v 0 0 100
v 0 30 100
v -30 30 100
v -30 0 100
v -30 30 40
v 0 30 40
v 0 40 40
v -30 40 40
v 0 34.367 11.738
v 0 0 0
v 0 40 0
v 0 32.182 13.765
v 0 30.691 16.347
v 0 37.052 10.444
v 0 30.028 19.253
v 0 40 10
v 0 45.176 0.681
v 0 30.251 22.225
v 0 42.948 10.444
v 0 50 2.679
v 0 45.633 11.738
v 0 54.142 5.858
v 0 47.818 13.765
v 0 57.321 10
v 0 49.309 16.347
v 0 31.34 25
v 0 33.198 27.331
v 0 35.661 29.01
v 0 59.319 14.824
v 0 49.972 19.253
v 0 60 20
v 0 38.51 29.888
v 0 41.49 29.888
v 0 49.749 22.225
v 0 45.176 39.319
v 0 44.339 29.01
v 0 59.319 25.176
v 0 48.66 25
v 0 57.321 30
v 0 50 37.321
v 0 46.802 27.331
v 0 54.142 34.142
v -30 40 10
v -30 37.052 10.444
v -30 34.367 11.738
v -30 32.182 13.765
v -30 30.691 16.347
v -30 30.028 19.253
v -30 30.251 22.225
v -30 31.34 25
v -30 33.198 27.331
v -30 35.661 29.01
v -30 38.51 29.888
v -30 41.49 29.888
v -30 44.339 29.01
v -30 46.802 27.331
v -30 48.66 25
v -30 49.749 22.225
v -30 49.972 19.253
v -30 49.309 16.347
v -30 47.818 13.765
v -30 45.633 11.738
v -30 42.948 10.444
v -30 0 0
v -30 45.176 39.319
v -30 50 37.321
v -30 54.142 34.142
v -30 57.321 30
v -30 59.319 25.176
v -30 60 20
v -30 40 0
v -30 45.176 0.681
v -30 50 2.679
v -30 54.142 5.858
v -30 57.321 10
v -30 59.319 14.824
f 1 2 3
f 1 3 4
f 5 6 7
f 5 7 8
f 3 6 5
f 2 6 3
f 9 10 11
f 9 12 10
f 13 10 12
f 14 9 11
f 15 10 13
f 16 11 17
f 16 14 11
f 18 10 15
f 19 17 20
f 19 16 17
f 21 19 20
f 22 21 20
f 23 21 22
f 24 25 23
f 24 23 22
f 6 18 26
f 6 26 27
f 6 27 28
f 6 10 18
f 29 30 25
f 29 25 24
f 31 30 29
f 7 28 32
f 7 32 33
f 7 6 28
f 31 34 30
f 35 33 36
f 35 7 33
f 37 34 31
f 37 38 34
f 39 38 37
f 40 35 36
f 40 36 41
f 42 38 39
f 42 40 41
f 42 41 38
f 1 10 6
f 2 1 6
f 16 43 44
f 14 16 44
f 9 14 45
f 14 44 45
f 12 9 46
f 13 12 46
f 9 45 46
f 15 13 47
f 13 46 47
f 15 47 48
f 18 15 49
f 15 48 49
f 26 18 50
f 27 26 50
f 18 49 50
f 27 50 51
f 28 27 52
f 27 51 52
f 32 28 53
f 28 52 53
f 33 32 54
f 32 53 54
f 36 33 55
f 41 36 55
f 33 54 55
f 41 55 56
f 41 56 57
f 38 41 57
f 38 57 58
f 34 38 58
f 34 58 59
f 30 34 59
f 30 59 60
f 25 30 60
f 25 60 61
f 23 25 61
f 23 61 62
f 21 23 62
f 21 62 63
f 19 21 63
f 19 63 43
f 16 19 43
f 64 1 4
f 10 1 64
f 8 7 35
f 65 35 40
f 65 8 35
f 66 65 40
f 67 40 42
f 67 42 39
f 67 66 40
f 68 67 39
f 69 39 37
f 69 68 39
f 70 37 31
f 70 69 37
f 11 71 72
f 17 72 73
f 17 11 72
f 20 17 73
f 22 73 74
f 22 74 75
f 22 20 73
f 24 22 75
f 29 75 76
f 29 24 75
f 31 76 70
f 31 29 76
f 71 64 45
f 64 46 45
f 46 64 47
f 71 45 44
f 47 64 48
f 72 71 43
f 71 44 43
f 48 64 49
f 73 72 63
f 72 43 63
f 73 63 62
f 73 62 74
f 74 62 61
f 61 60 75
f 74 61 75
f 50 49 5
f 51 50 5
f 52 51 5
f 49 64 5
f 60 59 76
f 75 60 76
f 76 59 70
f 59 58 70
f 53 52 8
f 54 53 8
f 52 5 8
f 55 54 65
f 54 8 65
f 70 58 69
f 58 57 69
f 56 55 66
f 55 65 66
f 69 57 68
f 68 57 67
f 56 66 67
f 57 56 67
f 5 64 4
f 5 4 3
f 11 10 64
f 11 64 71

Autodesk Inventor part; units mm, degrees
ref_plane "YZ Plane" through (0, 0, 0) normal (1, 0, 0) x (0, 1, 0)
ref_plane "XZ Plane" through (0, 0, 0) normal (0, 1, 0) x (-1, 0, 0)
ref_plane "XY Plane" through (0, 0, 0) normal (0, 0, 1) x (1, 0, 0)
sketch "Esboço1" plane through (0, 0, 0) normal (1, 0, 0) x (0, 1, 0)
  line L0 (0, 0) -> (30, 0)
  line L1 (30, 0) -> (30, 100)
  line L2 (30, 100) -> (0, 100)
  line L3 (0, 100) -> (0, 0)
  dimension "d0" = 30
  dimension "d1" = 100
extrude "Extrusão1" add sketch "Esboço1" against normal blind 30
sketch "Esboço2" plane through (0, 0, 0) normal (1, 0, 0) x (0, 0, -1)
  point P0 (0, 0)
sketch "Esboço3" plane through (0, 30, 100) normal (0, 1, 0) x (1, 0, 0)
  line L0 (-30, 0) -> (-30, 100) projected
  line L1 (0, 100) -> (0, 0) projected
  line L2 (-30, 100) -> (0, 100)
  line L3 (0, 100) -> (0, 60)
  line L4 (0, 60) -> (-30, 60)
  line L5 (-30, 60) -> (-30, 100)
  dimension "d4" = 40
extrude "Extrusão2" add sketch "Esboço3" along normal blind 30
fillet "Arredondamento2" radius 20 2 edges at (-15, 60, 40) (-15, 60, 0)
sketch "Esboço6" plane through (0, 0, 0) normal (1, 0, 0) x (0, 0, -1)
  arc A0 (0, 40) -> (-40, 40) centre (-20, 40) ccw projected
  point P0 (0, 0)
hole "Furo3" at (0, 40, 20) direction (-1, 0, 0) diameter 20 end through all
properties part number "Suporte"
